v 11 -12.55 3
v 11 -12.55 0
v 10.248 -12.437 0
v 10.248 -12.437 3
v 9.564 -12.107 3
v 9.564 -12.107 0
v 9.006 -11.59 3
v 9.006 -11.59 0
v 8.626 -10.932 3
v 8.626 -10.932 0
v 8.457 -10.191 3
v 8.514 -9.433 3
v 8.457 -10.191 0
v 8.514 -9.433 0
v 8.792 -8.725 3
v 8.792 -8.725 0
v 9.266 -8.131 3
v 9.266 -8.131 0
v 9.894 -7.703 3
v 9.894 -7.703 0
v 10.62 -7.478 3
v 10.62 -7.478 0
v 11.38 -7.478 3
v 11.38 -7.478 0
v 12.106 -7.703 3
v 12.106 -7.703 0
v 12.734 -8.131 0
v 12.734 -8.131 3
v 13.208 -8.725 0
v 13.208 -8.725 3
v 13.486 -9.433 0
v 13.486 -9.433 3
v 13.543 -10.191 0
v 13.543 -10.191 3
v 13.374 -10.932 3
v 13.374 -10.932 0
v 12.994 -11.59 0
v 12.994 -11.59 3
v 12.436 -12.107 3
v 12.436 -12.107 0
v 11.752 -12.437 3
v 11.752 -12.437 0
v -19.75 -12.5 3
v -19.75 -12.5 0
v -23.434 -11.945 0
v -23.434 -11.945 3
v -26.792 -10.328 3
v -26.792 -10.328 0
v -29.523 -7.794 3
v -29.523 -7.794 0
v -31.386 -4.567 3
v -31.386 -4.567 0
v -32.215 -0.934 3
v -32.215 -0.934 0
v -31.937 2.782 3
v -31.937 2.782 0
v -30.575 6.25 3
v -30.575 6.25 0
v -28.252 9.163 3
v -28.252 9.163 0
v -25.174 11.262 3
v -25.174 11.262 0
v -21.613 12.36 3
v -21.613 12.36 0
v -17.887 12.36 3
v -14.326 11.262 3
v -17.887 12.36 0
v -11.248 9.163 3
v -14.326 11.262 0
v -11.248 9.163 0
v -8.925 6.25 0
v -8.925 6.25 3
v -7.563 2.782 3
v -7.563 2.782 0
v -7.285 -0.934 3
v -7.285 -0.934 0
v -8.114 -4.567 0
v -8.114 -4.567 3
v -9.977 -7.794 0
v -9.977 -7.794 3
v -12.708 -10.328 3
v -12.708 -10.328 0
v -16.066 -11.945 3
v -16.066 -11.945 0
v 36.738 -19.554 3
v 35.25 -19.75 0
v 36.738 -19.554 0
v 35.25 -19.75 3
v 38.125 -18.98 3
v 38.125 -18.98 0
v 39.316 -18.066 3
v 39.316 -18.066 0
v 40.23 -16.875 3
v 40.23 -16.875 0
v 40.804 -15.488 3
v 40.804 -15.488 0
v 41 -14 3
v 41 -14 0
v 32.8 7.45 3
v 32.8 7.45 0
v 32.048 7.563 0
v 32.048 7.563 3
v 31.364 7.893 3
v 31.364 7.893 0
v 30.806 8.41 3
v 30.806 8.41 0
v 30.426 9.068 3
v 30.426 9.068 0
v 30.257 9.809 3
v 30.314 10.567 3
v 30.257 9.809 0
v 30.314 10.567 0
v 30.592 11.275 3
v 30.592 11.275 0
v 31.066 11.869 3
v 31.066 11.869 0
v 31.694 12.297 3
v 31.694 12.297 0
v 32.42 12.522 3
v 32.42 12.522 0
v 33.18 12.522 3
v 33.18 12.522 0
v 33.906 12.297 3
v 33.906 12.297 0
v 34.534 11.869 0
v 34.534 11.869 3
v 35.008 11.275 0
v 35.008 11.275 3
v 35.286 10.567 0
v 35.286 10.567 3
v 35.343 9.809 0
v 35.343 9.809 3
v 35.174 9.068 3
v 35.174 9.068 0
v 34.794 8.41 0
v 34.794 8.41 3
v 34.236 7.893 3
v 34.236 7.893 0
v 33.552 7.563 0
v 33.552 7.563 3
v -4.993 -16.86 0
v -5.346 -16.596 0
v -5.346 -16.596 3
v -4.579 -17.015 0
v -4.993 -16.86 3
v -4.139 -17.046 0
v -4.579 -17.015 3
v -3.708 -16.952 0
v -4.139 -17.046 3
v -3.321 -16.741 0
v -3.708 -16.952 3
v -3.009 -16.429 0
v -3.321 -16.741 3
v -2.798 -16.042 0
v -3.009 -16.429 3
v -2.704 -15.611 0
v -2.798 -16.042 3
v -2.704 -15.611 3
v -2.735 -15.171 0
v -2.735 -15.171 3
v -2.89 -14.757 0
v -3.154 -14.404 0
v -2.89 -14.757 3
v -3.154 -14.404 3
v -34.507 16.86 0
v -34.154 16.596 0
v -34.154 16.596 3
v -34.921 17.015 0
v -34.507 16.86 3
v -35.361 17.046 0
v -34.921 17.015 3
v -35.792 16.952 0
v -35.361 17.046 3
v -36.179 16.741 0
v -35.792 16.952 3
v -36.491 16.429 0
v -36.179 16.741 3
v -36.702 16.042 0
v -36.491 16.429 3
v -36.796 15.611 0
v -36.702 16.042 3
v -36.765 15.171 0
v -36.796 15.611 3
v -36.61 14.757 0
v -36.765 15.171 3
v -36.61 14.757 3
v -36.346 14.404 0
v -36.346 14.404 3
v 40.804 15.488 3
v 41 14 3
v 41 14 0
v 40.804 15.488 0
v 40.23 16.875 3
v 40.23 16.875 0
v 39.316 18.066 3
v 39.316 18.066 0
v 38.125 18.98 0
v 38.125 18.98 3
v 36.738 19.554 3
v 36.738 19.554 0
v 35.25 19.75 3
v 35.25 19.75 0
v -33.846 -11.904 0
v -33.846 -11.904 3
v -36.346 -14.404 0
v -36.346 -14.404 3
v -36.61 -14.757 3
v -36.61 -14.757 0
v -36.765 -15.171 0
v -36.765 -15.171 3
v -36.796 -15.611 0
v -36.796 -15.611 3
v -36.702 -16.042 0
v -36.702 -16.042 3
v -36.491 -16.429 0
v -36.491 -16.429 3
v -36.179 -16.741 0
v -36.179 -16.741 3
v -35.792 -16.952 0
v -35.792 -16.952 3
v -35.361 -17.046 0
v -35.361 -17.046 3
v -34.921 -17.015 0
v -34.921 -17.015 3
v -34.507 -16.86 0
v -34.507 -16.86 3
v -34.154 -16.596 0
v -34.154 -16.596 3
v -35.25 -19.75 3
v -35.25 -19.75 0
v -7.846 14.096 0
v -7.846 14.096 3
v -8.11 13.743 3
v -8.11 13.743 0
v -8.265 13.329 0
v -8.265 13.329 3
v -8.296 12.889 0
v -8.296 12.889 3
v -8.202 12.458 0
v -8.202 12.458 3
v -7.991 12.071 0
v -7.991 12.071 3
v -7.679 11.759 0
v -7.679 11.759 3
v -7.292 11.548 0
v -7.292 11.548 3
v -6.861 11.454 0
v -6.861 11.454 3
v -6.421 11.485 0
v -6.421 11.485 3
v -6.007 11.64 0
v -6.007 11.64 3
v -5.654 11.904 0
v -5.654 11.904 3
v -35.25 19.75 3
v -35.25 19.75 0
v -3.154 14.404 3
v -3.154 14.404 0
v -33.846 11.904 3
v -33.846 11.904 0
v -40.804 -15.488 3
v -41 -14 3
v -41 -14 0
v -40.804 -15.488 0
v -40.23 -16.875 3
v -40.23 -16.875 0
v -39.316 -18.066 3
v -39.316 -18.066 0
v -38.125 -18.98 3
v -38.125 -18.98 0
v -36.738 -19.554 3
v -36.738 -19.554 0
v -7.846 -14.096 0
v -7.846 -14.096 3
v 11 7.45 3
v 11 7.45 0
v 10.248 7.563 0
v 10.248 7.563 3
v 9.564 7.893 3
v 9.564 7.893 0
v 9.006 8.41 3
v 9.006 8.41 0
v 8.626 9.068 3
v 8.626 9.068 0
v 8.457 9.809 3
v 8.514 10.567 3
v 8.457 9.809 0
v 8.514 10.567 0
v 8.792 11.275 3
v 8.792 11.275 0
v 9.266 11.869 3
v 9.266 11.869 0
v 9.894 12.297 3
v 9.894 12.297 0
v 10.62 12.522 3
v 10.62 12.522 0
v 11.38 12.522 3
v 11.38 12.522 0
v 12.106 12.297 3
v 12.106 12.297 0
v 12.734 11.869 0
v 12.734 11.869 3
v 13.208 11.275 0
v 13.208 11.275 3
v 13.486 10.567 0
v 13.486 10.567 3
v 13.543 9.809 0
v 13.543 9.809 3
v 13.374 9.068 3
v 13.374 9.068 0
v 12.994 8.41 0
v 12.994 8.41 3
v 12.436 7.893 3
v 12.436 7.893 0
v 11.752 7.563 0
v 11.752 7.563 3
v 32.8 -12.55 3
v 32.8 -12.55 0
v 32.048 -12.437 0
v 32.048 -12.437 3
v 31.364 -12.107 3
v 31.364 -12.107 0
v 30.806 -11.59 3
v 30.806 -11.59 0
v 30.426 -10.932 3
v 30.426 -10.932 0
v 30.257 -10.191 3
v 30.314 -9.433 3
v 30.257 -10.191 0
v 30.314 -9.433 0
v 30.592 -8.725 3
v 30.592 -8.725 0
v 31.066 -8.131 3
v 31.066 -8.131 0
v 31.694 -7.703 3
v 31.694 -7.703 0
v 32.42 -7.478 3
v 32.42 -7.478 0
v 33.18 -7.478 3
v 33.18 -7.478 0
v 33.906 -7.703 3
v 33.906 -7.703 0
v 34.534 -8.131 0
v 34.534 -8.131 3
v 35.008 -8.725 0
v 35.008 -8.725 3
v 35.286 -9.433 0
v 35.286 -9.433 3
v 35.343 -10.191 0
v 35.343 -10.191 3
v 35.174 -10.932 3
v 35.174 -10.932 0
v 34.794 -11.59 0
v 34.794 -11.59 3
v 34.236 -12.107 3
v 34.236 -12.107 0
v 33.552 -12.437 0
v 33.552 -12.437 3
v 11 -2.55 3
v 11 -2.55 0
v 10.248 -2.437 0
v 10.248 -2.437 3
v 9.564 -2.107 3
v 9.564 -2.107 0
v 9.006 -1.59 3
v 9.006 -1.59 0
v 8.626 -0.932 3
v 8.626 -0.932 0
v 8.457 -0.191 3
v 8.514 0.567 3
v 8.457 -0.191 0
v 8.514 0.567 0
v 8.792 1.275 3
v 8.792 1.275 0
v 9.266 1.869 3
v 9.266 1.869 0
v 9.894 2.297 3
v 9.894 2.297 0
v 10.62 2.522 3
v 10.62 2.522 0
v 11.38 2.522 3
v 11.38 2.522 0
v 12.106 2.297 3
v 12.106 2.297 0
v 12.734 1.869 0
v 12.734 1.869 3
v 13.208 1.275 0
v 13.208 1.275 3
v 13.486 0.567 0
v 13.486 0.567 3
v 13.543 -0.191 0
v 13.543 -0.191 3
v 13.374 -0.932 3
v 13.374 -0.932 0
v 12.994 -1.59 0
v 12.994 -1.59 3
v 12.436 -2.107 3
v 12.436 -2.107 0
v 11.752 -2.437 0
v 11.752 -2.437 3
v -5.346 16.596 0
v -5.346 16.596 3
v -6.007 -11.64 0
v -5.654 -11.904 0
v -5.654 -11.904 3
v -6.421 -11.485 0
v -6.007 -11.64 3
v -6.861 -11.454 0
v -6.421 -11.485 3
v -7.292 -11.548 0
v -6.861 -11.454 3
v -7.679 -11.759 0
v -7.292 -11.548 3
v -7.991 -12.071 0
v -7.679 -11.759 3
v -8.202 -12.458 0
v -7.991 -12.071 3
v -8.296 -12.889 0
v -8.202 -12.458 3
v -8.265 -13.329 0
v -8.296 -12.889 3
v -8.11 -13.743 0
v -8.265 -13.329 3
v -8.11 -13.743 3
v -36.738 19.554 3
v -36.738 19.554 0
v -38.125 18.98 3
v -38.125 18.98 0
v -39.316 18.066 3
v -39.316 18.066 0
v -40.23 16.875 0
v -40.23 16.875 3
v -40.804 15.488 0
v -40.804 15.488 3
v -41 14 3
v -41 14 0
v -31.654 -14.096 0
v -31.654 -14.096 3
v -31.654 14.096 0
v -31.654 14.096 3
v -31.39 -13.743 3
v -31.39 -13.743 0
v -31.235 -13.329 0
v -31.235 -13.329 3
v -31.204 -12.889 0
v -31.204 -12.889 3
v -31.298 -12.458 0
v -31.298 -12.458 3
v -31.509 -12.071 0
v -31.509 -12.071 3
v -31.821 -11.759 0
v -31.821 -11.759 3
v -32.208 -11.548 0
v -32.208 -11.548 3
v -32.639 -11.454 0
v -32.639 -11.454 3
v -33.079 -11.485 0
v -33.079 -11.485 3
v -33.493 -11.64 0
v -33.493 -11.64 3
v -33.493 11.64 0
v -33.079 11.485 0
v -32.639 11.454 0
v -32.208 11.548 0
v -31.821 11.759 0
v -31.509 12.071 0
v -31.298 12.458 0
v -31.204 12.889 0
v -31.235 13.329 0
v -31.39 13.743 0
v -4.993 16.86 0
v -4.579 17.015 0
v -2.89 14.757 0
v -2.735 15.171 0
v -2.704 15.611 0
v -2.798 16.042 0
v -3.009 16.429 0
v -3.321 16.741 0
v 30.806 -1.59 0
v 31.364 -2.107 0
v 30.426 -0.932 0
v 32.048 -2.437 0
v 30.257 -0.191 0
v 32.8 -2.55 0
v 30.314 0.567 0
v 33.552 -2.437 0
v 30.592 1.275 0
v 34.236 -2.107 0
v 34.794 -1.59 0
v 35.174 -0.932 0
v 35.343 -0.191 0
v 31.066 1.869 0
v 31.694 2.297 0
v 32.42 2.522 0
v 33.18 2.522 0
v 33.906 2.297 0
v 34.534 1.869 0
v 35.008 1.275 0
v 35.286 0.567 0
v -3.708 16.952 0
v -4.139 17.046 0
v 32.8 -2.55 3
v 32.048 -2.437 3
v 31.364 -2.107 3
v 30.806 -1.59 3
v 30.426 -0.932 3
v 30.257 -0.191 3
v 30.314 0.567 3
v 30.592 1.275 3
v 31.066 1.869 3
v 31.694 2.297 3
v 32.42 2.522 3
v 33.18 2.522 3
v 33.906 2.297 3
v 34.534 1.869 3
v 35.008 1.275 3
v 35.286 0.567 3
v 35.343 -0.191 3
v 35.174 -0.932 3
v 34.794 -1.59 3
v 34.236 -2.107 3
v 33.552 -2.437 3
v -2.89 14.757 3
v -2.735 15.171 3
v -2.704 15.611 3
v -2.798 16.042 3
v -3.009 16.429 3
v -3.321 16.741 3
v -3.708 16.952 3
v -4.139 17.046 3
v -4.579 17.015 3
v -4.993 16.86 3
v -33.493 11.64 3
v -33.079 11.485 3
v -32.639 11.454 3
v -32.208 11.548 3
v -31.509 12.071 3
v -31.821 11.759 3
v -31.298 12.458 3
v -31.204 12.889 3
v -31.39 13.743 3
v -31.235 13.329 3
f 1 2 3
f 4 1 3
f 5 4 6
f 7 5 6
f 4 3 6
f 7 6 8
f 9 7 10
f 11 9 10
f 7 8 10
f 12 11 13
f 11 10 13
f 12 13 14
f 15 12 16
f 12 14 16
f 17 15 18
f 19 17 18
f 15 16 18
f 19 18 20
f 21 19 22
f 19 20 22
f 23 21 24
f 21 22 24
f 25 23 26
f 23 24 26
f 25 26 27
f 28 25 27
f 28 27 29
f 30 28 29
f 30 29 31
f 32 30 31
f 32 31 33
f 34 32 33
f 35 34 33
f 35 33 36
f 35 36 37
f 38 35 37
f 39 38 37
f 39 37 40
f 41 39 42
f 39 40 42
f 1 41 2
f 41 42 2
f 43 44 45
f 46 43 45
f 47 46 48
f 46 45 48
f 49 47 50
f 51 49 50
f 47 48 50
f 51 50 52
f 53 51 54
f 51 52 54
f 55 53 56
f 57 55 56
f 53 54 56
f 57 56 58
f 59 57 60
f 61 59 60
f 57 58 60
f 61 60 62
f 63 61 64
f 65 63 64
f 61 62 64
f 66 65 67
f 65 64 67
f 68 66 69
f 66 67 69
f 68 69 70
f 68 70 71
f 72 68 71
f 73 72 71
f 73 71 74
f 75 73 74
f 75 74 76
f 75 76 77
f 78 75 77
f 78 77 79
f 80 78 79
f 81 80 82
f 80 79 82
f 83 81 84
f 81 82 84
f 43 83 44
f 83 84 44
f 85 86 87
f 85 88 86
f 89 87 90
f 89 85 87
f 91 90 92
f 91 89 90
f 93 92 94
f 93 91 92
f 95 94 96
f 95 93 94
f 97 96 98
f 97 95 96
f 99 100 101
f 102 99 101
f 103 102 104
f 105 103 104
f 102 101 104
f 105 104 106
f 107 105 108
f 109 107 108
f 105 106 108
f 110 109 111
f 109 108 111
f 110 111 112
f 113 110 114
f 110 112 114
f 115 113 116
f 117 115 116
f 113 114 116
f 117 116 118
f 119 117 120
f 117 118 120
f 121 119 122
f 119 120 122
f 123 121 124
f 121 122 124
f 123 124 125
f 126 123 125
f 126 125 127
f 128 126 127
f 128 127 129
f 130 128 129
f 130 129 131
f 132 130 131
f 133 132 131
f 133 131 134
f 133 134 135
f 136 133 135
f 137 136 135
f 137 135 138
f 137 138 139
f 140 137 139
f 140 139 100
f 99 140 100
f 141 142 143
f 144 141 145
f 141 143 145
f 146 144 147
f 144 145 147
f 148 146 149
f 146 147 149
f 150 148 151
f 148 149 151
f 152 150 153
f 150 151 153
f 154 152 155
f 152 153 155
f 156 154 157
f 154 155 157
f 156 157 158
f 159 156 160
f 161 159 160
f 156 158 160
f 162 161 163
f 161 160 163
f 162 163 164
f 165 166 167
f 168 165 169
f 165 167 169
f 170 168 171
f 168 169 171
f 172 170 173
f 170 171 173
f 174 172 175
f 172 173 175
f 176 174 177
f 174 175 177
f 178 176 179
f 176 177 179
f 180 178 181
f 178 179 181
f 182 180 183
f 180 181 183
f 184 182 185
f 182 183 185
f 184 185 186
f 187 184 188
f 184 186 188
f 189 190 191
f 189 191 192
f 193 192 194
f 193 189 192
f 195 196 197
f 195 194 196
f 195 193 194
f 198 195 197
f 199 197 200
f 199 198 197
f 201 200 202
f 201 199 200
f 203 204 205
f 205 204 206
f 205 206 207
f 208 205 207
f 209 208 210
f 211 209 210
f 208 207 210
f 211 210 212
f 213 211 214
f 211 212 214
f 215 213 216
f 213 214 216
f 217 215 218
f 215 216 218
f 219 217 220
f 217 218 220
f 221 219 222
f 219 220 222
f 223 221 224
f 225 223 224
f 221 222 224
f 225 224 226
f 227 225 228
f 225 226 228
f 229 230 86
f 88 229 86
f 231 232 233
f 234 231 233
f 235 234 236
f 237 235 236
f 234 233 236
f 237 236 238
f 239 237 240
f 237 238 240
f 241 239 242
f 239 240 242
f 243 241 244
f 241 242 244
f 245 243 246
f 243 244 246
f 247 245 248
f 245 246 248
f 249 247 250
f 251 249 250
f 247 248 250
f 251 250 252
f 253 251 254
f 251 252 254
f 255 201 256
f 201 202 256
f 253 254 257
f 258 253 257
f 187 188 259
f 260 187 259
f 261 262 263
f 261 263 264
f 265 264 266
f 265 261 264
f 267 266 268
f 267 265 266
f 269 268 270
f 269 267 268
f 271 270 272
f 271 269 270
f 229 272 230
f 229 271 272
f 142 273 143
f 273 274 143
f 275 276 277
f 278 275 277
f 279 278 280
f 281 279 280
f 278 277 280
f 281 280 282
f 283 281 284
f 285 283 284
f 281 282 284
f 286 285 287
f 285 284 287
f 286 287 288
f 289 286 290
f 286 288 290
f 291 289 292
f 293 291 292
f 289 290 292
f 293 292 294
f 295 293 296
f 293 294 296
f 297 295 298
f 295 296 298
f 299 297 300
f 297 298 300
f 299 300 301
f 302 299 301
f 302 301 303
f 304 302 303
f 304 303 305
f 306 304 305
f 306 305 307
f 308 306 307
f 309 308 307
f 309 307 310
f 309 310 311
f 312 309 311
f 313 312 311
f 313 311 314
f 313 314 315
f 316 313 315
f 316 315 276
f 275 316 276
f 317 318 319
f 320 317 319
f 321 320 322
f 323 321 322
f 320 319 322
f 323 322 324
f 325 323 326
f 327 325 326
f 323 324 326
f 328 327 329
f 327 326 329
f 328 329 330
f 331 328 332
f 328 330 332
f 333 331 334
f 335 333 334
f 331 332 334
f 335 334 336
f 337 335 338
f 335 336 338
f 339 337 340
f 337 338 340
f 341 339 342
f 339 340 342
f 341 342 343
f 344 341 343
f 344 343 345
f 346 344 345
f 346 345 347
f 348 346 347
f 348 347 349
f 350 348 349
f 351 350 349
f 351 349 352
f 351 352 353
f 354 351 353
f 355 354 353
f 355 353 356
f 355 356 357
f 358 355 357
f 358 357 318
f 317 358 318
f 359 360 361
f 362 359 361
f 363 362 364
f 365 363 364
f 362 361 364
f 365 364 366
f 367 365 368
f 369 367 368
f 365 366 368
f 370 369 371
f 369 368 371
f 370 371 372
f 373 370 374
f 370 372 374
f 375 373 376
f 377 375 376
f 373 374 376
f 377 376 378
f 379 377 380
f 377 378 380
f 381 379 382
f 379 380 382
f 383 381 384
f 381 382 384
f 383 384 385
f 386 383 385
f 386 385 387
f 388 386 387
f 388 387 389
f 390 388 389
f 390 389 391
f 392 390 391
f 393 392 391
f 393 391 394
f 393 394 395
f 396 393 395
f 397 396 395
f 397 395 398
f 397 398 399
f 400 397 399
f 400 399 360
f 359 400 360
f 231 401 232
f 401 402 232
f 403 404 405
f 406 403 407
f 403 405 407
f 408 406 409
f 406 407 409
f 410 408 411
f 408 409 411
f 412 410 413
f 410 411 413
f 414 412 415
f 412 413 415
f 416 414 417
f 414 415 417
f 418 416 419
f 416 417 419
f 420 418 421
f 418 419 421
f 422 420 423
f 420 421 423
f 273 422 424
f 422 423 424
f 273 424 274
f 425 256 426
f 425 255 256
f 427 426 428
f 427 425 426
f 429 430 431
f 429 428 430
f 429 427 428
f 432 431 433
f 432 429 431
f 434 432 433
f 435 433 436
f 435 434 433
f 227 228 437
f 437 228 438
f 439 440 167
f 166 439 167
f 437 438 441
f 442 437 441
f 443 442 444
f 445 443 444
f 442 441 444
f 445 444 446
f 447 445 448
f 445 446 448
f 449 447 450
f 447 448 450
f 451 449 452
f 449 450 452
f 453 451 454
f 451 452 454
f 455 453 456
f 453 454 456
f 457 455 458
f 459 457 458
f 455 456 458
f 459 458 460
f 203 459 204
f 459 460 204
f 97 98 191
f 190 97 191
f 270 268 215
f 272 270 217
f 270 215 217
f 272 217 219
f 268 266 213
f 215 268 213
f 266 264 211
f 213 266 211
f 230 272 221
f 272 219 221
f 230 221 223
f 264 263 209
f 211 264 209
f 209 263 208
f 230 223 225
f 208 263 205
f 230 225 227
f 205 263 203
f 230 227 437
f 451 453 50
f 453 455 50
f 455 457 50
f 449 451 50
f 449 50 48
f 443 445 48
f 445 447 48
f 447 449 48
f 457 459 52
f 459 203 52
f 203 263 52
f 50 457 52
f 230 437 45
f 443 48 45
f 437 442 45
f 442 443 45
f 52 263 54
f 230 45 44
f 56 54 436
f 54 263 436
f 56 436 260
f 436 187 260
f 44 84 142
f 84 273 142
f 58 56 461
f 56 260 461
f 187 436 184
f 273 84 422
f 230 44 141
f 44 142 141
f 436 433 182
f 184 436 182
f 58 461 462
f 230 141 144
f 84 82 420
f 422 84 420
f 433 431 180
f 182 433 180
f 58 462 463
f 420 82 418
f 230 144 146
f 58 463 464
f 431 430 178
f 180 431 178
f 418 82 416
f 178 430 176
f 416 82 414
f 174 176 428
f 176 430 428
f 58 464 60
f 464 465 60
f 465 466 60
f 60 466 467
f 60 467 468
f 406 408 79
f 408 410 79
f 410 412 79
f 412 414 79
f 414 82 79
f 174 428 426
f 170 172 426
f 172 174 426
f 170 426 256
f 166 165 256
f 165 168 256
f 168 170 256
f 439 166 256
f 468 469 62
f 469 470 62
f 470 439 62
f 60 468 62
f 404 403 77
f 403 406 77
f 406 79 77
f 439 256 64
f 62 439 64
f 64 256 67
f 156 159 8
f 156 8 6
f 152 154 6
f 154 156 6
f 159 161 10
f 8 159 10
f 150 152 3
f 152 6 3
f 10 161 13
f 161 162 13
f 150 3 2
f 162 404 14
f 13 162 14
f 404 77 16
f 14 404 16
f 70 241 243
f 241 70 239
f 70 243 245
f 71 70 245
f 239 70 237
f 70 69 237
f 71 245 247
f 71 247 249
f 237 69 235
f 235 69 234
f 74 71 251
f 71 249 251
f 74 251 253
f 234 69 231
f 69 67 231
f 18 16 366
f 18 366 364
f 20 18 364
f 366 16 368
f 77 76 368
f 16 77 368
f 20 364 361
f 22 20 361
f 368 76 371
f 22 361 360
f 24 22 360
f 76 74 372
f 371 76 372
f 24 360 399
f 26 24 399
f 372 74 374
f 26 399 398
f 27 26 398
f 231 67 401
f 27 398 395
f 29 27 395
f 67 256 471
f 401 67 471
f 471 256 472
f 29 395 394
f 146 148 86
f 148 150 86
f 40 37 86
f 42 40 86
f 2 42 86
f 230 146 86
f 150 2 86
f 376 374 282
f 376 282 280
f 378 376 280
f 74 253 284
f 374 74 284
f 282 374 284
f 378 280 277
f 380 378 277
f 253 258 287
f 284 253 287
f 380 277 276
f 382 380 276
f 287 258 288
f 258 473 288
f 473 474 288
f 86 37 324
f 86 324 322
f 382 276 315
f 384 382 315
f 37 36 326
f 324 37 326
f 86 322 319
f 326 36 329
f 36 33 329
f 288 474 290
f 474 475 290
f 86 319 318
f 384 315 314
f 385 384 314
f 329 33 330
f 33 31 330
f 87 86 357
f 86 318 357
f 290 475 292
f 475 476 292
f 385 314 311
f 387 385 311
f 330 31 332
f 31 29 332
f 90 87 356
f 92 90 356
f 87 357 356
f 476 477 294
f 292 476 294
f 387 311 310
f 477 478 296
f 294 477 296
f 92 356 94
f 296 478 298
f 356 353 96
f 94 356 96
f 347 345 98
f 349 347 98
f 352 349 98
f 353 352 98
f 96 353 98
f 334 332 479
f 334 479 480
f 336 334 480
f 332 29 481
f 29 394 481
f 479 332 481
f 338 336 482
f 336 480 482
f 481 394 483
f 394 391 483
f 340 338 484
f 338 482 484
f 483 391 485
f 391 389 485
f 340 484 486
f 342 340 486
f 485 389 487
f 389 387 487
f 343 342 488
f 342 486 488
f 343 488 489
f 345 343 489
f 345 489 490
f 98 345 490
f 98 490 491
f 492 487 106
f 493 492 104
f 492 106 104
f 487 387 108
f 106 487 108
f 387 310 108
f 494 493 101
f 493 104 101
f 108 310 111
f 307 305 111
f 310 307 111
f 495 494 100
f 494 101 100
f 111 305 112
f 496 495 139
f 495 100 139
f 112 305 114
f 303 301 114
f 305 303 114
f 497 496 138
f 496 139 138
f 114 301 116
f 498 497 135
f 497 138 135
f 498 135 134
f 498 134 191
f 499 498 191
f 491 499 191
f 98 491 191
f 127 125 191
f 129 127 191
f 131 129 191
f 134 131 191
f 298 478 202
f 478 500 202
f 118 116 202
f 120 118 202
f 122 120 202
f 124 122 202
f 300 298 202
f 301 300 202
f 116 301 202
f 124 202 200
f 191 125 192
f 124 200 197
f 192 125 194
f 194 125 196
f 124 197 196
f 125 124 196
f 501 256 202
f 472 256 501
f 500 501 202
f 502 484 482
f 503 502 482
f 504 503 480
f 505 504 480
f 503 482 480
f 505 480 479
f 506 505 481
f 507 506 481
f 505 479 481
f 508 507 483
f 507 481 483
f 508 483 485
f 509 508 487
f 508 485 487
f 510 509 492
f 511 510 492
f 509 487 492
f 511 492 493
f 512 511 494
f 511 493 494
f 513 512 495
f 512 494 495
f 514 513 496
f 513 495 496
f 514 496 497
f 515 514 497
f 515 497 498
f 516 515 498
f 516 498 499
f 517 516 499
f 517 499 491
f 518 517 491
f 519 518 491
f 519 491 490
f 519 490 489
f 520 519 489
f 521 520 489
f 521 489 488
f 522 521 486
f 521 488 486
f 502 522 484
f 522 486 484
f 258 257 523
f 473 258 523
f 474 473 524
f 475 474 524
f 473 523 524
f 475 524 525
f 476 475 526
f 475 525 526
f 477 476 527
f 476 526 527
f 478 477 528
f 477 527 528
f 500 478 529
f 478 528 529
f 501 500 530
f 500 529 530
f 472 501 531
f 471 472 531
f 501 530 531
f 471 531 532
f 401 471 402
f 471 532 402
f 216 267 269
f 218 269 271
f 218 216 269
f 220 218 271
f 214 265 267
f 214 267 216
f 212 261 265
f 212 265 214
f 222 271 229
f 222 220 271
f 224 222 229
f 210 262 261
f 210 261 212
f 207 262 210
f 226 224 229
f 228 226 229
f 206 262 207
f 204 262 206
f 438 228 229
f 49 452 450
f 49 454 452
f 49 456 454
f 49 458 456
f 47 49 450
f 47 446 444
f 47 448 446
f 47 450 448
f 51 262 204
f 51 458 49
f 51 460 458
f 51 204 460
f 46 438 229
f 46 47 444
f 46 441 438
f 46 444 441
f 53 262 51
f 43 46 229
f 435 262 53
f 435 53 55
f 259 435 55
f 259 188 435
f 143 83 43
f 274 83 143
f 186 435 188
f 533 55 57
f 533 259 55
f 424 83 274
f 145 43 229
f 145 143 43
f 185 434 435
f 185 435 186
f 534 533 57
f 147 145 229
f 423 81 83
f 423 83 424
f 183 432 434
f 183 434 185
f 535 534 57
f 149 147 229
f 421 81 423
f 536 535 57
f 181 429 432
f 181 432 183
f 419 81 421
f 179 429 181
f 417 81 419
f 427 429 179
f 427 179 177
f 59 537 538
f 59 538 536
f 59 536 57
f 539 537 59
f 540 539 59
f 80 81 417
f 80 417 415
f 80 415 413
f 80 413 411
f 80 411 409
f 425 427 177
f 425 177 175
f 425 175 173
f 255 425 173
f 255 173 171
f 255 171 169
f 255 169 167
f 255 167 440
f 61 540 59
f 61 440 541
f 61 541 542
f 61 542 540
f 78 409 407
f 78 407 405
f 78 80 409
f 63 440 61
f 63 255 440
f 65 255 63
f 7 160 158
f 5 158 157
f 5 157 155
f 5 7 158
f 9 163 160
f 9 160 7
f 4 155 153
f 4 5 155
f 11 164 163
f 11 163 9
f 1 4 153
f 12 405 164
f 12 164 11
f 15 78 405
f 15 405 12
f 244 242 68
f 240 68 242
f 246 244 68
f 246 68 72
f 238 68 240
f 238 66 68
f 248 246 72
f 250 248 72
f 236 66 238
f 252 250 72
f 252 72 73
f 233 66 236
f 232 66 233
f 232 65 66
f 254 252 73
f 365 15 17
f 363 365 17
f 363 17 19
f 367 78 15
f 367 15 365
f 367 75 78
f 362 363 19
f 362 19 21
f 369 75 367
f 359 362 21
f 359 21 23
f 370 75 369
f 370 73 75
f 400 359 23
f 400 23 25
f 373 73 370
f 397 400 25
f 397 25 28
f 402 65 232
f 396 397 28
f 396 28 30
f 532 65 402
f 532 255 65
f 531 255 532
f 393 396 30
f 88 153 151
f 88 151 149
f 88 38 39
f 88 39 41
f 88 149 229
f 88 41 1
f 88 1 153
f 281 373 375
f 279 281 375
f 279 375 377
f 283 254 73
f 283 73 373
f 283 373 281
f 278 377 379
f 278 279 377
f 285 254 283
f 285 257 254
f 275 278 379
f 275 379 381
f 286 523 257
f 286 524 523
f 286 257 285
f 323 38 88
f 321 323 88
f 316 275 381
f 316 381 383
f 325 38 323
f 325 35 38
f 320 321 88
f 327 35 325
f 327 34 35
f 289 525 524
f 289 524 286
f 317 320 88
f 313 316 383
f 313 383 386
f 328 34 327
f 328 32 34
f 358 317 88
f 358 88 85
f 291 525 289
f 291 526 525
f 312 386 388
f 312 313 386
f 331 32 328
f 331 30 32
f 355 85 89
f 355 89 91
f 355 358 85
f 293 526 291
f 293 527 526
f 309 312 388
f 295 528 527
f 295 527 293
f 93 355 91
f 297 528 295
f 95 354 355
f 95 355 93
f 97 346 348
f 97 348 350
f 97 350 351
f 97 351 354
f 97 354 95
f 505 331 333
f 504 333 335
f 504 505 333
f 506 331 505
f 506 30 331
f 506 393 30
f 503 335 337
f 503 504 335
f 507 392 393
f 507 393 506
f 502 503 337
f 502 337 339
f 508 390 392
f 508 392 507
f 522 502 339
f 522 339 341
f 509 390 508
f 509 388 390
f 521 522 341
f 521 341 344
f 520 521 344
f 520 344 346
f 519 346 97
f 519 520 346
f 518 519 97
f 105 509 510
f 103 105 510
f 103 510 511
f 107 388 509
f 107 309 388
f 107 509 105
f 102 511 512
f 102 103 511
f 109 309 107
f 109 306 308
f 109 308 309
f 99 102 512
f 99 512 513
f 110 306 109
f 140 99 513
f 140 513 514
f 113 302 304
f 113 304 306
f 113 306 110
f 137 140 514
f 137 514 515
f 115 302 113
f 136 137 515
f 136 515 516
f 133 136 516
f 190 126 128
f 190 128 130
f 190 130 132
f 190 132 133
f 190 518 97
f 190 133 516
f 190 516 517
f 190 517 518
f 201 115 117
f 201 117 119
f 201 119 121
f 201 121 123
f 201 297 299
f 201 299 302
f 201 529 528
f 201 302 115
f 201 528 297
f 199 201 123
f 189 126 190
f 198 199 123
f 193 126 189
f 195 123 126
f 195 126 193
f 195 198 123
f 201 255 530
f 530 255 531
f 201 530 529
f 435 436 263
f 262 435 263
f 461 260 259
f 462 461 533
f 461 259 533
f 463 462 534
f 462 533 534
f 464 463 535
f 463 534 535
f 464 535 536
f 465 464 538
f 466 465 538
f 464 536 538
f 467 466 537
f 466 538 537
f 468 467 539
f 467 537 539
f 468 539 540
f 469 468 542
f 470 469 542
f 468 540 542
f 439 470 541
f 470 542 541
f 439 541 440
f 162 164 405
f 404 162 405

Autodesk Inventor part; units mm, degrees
ref_plane "YZ Plane" through (0, 0, 0) normal (1, 0, 0) x (0, 1, 0)
sketch "Sketch1" plane through (0, 0, 0) normal (0, 0, 1) x (1, 0, 0)
  line L0 (-41, -19.75) -> (41, -19.75)
  line L1 (41, -19.75) -> (41, 19.75)
  line L2 (41, 19.75) -> (-41, 19.75)
  line L3 (-41, 19.75) -> (-41, -19.75)
  line L4 (-41, -19.75) -> (41, 19.75) construction
  line L5 (41, -19.75) -> (-41, 19.75) construction
  point P0 (0, 0)
  dimension "d0" = 82
  dimension "d1" = 39.5
extrude "Extrusion1" add sketch "Sketch1" along normal blind 3
sketch "Sketch2" plane through (0, 0, 3) normal (0, 0, 1) x (1, 0, 0)
  line L0 (-41, -19.75) -> (41, -19.75) projected
  line L1 (41, -19.75) -> (41, 19.75) projected
  line L2 (41, 19.75) -> (-41, 19.75) projected
  line L3 (-41, 19.75) -> (-41, -19.75) projected
  line L4 (-41, 0) -> (41, 0) construction
  line L5 (-19.75, 19.75) -> (-19.75, -19.75) construction
  point P0 (0, 0)
  point P1 (-19.75, 0)
  dimension "d4" = 21.25
hole "Hole1" at (-19.75, 0, 3) direction (0, 0, -1) diameter 25 end through all
sketch "Sketch3" plane through (0, 0, 3) normal (0, 0, 1) x (1, 0, 0)
  circle A0 centre (-19.75, 0) radius 12.5 projected
  line L0 (-41, -19.75) -> (41, -19.75) projected
  line L1 (41, 19.75) -> (-41, 19.75) projected
  line L2 (-41, 19.75) -> (-41, -19.75) projected
  line L3 (-19.75, 0) -> (8.1807, 0) construction
  line L4 (-19.75, 0) -> (0, 19.75) construction
  line L5 (-19.75, 0) -> (8.1807, 0) construction
  line L6 (-19.75, 0) -> (0, -19.75) construction
  line L7 (-19.75, 0) -> (-39.5, 19.75) construction
  line L8 (-19.75, 0) -> (-39.5, -19.75) construction
  arc A1 (-31.654, -14.096) -> (-33.846, -11.904) centre (-32.75, -13) ccw
  arc A2 (-36.346, -14.404) -> (-34.154, -16.596) centre (-35.25, -15.5) ccw
  line L9 (-33.846, -11.904) -> (-36.346, -14.404)
  line L10 (-34.154, -16.596) -> (-31.654, -14.096)
  point P0 (0, 0)
  dimension "d13" = 45
  dimension "d14" = 5.75
  dimension "d15" = 8.25
  dimension "d16" = 35.25
  dimension "d17" = 32.75
  dimension "d18" = 3.1
  dimension "d19" = 3.1
extrude "Extrusion2" cut sketch "Sketch3" against normal through all contours L10 A2 L9 A1
ref_plane "Work Plane1" through (-41, 0, 0) normal (0, 1, 0) x (1, 0, 0)
ref_plane "Work Plane2" through (-19.75, 0, 3) normal (-1, 0, 0) x (0, 0, 1)
mirror "Mirror1" about plane through (-19.75, 0, 3) normal (-1, 0, 0) of "Extrusion2"
mirror "Mirror2" about plane through (-41, 0, 0) normal (0, 1, 0) of "Extrusion2", "Mirror1"
sketch "Sketch4" plane through (0, 0, 3) normal (0, 0, 1) x (1, 0, 0)
  circle A0 centre (-19.75, 0) radius 12.5 projected
  line L0 (-41, -19.75) -> (41, -19.75) projected
  line L1 (41, -19.75) -> (41, 19.75) projected
  line L2 (41, 19.75) -> (-41, 19.75) projected
  line L3 (-41, 19.75) -> (-41, -19.75) projected
  line L4 (11, 19.75) -> (11, -19.75) construction
  line L5 (21.9, 19.75) -> (21.9, -19.75) construction
  line L6 (41, 0) -> (-41, 0) construction
  point P0 (0, 0)
  point P1 (11, 0)
  point P2 (11, 10)
  point P3 (11, -10)
  point P4 (32.8, 0)
  point P5 (32.8, 10)
  point P6 (32.8, -10)
  dimension "d22" = 52
  dimension "d23" = 10.9
  dimension "d24" = 10
  dimension "d25" = 8.2
  dimension "d26" = 9.75
  dimension "d27" = 21.8
  dimension "d28" = 30.75
hole "Hole2" at (11, 0, 3) at (11, 10, 3) at (11, -10, 3) at (32.8, -10, 3) at (32.8, 10, 3) at (32.8, 0, 3) direction (0, 0, -1) diameter 5.1 end through all
fillet "Fillet1" radius 5.75 4 edges at (-41, 19.75, 1.5) (-41, -19.75, 1.5) (41, -19.75, 1.5) (41, 19.75, 1.5)
equation "\"d19\" = d18"
properties part number "V-Slot Motor Mount Plate" material "Aluminum 6061"
